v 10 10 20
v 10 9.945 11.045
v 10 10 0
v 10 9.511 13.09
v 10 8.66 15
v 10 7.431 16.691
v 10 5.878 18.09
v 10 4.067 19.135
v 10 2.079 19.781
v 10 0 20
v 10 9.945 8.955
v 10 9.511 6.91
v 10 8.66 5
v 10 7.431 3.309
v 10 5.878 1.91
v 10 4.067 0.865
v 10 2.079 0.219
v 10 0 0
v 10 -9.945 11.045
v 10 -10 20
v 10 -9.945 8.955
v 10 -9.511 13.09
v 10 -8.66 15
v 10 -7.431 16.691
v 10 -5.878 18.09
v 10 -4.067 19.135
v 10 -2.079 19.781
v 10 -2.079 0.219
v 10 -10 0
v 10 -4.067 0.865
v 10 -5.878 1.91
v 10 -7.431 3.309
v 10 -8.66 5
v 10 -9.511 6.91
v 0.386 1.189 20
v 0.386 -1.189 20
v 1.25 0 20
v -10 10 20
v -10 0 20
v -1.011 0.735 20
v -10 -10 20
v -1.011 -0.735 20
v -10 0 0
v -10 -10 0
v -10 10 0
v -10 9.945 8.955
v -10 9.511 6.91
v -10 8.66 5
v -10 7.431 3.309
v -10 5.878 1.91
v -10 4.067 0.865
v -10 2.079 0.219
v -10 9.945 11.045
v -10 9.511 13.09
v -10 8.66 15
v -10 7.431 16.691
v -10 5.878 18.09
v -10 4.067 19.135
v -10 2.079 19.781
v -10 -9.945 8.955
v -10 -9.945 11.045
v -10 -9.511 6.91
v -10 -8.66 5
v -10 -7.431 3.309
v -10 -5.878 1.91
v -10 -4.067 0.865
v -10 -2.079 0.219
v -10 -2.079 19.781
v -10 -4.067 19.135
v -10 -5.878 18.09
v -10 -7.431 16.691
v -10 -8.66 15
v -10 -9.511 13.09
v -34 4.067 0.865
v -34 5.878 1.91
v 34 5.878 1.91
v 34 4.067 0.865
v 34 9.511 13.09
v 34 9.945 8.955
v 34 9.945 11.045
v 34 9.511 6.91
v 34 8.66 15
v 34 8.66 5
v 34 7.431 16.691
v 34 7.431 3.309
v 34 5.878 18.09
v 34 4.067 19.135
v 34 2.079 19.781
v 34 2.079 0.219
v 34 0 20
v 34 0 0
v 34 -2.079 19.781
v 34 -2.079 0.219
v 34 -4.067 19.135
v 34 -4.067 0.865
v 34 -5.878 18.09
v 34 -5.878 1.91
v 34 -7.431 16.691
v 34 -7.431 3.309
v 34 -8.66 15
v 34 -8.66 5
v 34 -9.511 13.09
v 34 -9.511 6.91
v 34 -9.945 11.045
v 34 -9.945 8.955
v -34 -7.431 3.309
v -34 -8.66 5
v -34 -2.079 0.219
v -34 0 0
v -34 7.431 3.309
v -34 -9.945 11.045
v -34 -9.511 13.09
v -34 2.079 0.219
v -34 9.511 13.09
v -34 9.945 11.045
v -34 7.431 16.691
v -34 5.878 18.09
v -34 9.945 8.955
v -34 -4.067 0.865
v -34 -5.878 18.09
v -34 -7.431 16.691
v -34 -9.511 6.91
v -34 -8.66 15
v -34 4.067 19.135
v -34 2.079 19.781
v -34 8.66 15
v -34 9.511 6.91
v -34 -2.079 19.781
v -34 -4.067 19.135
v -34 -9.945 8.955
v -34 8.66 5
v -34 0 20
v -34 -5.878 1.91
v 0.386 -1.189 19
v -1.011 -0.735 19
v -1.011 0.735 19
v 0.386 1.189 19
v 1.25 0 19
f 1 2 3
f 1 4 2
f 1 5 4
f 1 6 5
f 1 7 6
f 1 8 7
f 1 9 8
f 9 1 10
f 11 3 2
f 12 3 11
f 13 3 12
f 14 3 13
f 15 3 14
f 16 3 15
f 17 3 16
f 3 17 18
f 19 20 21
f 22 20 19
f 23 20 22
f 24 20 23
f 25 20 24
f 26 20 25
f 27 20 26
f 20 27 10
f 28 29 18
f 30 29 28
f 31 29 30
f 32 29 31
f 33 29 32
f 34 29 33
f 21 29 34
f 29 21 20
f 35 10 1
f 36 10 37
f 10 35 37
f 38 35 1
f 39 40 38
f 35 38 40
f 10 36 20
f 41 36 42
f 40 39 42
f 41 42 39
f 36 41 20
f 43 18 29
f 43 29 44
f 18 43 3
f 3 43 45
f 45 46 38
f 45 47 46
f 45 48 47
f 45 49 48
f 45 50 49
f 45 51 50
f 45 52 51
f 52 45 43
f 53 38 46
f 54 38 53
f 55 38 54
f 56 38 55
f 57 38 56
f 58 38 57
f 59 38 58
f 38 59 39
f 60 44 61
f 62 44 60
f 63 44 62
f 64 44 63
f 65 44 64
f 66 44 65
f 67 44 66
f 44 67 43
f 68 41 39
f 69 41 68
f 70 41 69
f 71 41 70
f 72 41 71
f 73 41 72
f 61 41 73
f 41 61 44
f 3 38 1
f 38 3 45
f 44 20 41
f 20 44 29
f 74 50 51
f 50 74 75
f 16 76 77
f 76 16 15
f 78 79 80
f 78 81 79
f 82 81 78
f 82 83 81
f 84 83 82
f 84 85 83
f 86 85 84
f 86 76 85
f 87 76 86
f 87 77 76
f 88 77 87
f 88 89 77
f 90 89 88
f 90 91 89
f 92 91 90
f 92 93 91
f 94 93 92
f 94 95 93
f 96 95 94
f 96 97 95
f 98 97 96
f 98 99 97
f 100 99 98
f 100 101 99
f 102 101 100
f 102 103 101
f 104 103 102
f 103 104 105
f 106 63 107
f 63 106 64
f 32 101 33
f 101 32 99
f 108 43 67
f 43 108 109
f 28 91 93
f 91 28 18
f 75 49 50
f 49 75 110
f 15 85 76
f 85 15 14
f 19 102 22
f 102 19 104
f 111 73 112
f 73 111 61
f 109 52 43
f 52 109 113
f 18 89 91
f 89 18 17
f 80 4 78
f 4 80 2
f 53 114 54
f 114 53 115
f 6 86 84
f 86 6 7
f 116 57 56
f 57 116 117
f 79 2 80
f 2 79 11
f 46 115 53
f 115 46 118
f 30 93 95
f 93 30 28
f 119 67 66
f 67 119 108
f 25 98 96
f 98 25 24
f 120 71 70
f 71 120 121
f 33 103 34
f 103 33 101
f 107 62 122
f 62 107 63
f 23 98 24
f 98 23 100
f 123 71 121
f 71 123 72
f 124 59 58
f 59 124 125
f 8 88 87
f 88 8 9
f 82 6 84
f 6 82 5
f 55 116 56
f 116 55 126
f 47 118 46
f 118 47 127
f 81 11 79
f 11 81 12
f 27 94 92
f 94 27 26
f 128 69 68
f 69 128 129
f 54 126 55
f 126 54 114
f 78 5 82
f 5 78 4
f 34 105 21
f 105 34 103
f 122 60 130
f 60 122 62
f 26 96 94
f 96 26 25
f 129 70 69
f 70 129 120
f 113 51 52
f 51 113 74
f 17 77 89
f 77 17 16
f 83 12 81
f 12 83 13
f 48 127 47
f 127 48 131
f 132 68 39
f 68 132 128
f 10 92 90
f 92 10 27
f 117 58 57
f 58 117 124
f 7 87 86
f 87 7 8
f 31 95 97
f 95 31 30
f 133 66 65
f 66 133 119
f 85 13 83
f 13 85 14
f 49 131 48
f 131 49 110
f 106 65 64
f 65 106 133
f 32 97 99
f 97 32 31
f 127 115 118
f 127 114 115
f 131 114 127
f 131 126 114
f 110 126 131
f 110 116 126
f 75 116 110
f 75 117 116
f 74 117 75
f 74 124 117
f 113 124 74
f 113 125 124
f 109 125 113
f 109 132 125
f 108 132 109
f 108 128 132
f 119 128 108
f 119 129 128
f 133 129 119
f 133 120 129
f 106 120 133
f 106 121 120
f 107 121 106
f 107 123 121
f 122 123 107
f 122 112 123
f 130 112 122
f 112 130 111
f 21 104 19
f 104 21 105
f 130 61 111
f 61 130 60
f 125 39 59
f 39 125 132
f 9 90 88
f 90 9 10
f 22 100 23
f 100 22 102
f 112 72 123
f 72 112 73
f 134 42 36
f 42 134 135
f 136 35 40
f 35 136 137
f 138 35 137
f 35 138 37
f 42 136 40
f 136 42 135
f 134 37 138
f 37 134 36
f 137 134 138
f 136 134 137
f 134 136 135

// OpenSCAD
cube_size = 20; // [10:Small,20:Medium,30:Large]

hole_diameter = 2.5; 
hole_radius = hole_diameter/2;

// How deep should the center hole be?
hole_depth = 1; // [0,1,5,50]

show_wheels = "yes"; // [yes,no]

// How thick should the side wheels be?
wheel_thickness = 24; // [1:40]

// ignore this variable!
// foo=1;

// don't turn functions into params!
function BEZ03(u) = pow((1-u), 3);

// ignore variable values
bing = 3+4;
baz = 3 / hole_depth;

difference() {
  union() {
    translate([0, 0, cube_size/2]) cube([cube_size,cube_size,cube_size], center=true);
    if (show_wheels == "yes") {
      translate([0, 0, cube_size/2]) rotate([0, 90, 0]) {
        cylinder(r=cube_size/2, h=cube_size+(wheel_thickness*2), center=true);
      }
    }
  }
  translate([0, 0, cube_size-hole_depth]) cylinder(r=hole_radius, h=hole_depth);
}
        
